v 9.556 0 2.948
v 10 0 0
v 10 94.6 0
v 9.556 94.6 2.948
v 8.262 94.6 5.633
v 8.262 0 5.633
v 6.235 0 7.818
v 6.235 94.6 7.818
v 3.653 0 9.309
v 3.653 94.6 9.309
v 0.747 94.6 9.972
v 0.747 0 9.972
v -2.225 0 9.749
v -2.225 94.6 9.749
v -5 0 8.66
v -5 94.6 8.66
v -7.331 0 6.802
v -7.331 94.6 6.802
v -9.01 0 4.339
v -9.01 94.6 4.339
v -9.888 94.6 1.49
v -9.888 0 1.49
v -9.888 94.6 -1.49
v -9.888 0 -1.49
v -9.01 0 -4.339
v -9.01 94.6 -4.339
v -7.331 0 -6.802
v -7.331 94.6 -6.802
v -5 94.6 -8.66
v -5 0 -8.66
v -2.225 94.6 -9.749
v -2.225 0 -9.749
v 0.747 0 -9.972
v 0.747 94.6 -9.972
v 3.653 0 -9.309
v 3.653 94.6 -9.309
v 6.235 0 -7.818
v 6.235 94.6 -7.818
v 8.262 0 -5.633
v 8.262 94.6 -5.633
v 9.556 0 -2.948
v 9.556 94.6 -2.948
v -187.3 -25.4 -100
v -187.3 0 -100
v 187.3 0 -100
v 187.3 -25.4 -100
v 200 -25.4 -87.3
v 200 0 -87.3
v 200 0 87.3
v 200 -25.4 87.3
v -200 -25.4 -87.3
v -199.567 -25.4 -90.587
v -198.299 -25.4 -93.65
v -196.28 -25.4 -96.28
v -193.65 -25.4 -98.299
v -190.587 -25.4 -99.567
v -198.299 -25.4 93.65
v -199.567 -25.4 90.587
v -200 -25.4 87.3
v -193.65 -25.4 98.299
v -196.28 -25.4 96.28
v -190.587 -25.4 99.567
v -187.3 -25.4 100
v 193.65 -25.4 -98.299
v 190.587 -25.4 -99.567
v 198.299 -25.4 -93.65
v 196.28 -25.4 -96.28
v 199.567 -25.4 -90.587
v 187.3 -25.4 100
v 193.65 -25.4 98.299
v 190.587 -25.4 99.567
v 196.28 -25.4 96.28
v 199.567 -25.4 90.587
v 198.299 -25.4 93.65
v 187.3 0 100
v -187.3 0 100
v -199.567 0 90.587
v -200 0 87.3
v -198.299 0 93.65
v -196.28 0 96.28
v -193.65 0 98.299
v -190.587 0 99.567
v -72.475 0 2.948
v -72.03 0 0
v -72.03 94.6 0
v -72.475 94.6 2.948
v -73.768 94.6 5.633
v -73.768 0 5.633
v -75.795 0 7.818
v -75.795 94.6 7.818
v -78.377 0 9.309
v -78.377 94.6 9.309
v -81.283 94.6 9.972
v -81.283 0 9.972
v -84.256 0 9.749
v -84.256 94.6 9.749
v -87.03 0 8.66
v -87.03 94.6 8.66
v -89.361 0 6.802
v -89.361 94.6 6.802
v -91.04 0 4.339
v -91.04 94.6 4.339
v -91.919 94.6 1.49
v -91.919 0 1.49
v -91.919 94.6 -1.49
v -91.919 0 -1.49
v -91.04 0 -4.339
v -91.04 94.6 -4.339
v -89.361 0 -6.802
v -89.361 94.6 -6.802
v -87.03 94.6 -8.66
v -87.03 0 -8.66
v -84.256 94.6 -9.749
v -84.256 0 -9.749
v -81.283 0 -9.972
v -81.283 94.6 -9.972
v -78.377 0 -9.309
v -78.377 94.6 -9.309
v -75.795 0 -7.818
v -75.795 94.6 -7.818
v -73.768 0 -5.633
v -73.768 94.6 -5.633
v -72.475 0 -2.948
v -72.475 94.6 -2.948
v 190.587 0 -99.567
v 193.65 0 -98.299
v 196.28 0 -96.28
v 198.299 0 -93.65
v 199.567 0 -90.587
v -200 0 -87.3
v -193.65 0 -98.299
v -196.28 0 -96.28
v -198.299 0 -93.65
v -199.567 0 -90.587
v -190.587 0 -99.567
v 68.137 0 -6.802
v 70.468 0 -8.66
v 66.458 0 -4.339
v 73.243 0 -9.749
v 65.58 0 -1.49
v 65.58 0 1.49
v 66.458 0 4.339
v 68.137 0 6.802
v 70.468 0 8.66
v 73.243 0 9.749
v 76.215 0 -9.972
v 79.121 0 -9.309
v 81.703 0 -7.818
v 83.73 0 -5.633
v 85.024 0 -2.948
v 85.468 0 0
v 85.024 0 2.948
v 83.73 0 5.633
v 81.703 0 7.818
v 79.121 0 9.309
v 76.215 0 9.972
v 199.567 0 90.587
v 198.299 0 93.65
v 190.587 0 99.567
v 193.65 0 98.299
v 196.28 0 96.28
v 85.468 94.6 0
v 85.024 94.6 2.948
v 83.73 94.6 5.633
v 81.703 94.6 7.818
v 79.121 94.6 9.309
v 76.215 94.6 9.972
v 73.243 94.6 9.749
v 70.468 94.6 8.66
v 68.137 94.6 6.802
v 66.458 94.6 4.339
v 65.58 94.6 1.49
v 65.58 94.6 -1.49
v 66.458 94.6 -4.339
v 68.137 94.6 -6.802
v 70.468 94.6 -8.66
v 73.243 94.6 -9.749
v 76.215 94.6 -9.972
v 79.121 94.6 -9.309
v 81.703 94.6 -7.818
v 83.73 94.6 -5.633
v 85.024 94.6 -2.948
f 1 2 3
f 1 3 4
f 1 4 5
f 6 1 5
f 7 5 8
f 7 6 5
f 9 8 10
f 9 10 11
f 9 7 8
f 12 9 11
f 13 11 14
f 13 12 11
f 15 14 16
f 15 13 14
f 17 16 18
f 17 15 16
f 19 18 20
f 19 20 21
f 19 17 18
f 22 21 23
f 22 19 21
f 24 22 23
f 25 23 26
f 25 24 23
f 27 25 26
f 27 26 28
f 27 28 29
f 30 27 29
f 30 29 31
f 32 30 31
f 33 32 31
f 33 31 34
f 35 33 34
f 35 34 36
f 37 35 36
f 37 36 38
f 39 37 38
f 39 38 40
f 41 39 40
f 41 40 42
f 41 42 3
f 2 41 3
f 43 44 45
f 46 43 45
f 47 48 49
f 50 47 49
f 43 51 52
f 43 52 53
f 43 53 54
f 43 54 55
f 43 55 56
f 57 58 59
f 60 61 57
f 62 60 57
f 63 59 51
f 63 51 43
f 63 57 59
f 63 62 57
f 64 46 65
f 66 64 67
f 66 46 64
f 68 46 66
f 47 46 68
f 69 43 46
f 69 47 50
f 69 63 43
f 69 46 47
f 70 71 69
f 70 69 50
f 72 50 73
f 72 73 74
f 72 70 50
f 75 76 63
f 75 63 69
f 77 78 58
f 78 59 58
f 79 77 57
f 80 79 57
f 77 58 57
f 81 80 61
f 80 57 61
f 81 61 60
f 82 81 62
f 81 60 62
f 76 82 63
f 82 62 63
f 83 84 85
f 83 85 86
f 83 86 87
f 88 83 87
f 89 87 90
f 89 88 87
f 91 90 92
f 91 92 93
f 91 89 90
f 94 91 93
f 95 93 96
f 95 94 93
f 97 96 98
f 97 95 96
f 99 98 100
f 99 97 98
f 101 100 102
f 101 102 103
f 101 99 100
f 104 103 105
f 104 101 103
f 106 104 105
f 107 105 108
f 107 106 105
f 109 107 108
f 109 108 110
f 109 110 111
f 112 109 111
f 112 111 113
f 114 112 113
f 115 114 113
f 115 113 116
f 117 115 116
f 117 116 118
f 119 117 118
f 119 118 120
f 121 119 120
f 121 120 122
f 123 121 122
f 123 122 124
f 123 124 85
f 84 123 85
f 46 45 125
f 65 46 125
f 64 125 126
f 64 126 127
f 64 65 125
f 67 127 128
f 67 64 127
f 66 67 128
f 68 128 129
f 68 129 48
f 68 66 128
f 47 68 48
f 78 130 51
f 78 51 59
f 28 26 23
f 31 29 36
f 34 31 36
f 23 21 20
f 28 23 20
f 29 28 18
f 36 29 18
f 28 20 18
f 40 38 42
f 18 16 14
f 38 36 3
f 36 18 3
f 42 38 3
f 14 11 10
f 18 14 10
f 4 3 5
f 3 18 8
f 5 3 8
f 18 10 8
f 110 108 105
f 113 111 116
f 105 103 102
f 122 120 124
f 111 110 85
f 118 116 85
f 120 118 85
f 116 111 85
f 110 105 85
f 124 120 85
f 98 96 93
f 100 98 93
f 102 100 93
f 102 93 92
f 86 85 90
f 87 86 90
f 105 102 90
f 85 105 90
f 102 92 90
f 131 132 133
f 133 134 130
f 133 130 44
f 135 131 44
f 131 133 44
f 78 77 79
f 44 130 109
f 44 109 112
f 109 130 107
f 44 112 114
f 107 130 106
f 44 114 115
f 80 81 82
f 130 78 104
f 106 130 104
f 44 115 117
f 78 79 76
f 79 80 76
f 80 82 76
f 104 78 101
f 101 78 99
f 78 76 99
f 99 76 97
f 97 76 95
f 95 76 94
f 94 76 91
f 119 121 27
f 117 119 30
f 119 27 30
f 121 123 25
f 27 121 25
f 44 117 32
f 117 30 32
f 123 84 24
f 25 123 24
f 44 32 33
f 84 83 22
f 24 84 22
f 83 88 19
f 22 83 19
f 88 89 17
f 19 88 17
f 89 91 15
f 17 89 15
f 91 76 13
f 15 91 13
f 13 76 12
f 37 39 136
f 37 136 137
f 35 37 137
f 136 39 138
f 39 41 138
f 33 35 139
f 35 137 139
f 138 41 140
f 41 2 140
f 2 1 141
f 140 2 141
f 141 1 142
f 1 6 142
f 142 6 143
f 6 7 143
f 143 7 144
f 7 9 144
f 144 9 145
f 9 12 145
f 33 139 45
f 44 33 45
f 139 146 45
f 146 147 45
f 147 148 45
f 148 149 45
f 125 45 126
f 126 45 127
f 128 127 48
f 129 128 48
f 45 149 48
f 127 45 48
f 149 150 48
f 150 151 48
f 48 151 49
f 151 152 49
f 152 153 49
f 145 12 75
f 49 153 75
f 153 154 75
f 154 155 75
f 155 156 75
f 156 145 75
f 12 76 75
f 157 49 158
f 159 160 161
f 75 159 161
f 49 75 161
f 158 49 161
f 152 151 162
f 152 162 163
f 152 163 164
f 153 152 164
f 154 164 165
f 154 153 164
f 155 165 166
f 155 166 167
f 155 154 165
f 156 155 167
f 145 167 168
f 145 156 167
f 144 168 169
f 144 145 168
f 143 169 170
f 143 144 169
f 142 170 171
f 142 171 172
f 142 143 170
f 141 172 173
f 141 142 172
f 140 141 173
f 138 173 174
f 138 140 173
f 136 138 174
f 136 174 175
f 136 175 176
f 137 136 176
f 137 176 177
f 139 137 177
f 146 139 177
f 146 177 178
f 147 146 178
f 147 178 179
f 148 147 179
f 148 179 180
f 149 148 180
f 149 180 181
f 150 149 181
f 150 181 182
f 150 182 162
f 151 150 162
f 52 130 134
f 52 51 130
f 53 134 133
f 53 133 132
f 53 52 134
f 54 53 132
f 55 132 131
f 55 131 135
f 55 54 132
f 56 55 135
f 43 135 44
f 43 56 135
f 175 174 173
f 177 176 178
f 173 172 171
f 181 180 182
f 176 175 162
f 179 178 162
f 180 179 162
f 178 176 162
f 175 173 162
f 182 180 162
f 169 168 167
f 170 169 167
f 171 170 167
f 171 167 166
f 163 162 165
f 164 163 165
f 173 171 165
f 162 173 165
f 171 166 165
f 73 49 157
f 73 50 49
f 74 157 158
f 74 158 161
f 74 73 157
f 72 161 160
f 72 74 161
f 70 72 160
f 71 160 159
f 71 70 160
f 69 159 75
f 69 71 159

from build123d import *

# Parameters (mm, degrees)
F0_W     = 400
F0_H     = 200
F1_DEPTH = 25.4
F3_R     = 12.7
F4_R     = 12.7
F2_R     = 10
F5_DEPTH = 120


with BuildPart() as f1:
    # F0 (on Front) → F1 (new body)
    with BuildSketch(Plane.XZ):
        Rectangle(F0_W, F0_H)
    extrude(amount=F1_DEPTH)

    # F3
    f3_edges = [f1.edges().sort_by_distance(p)[0] for p in [
        (-200, -12.7, -100),
        (200, -12.7, -100),
        (200, -12.7, 100),
    ]]
    fillet(f3_edges, radius=F3_R)

    # F4
    f4_edges = [f1.edges().sort_by_distance(p)[0] for p in [
        (-200, -12.7, 100),
    ]]
    fillet(f4_edges, radius=F4_R)

    # F2 (on face) → F5 (join)
    with BuildSketch(Plane.XZ.offset(25.4)):
        with Locations((-82.030319, 0)):
            Circle(F2_R)
        Circle(F2_R)
        with Locations((75.467892, 0)):
            Circle(F2_R)
    extrude(amount=-F5_DEPTH)


solid = f1.part
